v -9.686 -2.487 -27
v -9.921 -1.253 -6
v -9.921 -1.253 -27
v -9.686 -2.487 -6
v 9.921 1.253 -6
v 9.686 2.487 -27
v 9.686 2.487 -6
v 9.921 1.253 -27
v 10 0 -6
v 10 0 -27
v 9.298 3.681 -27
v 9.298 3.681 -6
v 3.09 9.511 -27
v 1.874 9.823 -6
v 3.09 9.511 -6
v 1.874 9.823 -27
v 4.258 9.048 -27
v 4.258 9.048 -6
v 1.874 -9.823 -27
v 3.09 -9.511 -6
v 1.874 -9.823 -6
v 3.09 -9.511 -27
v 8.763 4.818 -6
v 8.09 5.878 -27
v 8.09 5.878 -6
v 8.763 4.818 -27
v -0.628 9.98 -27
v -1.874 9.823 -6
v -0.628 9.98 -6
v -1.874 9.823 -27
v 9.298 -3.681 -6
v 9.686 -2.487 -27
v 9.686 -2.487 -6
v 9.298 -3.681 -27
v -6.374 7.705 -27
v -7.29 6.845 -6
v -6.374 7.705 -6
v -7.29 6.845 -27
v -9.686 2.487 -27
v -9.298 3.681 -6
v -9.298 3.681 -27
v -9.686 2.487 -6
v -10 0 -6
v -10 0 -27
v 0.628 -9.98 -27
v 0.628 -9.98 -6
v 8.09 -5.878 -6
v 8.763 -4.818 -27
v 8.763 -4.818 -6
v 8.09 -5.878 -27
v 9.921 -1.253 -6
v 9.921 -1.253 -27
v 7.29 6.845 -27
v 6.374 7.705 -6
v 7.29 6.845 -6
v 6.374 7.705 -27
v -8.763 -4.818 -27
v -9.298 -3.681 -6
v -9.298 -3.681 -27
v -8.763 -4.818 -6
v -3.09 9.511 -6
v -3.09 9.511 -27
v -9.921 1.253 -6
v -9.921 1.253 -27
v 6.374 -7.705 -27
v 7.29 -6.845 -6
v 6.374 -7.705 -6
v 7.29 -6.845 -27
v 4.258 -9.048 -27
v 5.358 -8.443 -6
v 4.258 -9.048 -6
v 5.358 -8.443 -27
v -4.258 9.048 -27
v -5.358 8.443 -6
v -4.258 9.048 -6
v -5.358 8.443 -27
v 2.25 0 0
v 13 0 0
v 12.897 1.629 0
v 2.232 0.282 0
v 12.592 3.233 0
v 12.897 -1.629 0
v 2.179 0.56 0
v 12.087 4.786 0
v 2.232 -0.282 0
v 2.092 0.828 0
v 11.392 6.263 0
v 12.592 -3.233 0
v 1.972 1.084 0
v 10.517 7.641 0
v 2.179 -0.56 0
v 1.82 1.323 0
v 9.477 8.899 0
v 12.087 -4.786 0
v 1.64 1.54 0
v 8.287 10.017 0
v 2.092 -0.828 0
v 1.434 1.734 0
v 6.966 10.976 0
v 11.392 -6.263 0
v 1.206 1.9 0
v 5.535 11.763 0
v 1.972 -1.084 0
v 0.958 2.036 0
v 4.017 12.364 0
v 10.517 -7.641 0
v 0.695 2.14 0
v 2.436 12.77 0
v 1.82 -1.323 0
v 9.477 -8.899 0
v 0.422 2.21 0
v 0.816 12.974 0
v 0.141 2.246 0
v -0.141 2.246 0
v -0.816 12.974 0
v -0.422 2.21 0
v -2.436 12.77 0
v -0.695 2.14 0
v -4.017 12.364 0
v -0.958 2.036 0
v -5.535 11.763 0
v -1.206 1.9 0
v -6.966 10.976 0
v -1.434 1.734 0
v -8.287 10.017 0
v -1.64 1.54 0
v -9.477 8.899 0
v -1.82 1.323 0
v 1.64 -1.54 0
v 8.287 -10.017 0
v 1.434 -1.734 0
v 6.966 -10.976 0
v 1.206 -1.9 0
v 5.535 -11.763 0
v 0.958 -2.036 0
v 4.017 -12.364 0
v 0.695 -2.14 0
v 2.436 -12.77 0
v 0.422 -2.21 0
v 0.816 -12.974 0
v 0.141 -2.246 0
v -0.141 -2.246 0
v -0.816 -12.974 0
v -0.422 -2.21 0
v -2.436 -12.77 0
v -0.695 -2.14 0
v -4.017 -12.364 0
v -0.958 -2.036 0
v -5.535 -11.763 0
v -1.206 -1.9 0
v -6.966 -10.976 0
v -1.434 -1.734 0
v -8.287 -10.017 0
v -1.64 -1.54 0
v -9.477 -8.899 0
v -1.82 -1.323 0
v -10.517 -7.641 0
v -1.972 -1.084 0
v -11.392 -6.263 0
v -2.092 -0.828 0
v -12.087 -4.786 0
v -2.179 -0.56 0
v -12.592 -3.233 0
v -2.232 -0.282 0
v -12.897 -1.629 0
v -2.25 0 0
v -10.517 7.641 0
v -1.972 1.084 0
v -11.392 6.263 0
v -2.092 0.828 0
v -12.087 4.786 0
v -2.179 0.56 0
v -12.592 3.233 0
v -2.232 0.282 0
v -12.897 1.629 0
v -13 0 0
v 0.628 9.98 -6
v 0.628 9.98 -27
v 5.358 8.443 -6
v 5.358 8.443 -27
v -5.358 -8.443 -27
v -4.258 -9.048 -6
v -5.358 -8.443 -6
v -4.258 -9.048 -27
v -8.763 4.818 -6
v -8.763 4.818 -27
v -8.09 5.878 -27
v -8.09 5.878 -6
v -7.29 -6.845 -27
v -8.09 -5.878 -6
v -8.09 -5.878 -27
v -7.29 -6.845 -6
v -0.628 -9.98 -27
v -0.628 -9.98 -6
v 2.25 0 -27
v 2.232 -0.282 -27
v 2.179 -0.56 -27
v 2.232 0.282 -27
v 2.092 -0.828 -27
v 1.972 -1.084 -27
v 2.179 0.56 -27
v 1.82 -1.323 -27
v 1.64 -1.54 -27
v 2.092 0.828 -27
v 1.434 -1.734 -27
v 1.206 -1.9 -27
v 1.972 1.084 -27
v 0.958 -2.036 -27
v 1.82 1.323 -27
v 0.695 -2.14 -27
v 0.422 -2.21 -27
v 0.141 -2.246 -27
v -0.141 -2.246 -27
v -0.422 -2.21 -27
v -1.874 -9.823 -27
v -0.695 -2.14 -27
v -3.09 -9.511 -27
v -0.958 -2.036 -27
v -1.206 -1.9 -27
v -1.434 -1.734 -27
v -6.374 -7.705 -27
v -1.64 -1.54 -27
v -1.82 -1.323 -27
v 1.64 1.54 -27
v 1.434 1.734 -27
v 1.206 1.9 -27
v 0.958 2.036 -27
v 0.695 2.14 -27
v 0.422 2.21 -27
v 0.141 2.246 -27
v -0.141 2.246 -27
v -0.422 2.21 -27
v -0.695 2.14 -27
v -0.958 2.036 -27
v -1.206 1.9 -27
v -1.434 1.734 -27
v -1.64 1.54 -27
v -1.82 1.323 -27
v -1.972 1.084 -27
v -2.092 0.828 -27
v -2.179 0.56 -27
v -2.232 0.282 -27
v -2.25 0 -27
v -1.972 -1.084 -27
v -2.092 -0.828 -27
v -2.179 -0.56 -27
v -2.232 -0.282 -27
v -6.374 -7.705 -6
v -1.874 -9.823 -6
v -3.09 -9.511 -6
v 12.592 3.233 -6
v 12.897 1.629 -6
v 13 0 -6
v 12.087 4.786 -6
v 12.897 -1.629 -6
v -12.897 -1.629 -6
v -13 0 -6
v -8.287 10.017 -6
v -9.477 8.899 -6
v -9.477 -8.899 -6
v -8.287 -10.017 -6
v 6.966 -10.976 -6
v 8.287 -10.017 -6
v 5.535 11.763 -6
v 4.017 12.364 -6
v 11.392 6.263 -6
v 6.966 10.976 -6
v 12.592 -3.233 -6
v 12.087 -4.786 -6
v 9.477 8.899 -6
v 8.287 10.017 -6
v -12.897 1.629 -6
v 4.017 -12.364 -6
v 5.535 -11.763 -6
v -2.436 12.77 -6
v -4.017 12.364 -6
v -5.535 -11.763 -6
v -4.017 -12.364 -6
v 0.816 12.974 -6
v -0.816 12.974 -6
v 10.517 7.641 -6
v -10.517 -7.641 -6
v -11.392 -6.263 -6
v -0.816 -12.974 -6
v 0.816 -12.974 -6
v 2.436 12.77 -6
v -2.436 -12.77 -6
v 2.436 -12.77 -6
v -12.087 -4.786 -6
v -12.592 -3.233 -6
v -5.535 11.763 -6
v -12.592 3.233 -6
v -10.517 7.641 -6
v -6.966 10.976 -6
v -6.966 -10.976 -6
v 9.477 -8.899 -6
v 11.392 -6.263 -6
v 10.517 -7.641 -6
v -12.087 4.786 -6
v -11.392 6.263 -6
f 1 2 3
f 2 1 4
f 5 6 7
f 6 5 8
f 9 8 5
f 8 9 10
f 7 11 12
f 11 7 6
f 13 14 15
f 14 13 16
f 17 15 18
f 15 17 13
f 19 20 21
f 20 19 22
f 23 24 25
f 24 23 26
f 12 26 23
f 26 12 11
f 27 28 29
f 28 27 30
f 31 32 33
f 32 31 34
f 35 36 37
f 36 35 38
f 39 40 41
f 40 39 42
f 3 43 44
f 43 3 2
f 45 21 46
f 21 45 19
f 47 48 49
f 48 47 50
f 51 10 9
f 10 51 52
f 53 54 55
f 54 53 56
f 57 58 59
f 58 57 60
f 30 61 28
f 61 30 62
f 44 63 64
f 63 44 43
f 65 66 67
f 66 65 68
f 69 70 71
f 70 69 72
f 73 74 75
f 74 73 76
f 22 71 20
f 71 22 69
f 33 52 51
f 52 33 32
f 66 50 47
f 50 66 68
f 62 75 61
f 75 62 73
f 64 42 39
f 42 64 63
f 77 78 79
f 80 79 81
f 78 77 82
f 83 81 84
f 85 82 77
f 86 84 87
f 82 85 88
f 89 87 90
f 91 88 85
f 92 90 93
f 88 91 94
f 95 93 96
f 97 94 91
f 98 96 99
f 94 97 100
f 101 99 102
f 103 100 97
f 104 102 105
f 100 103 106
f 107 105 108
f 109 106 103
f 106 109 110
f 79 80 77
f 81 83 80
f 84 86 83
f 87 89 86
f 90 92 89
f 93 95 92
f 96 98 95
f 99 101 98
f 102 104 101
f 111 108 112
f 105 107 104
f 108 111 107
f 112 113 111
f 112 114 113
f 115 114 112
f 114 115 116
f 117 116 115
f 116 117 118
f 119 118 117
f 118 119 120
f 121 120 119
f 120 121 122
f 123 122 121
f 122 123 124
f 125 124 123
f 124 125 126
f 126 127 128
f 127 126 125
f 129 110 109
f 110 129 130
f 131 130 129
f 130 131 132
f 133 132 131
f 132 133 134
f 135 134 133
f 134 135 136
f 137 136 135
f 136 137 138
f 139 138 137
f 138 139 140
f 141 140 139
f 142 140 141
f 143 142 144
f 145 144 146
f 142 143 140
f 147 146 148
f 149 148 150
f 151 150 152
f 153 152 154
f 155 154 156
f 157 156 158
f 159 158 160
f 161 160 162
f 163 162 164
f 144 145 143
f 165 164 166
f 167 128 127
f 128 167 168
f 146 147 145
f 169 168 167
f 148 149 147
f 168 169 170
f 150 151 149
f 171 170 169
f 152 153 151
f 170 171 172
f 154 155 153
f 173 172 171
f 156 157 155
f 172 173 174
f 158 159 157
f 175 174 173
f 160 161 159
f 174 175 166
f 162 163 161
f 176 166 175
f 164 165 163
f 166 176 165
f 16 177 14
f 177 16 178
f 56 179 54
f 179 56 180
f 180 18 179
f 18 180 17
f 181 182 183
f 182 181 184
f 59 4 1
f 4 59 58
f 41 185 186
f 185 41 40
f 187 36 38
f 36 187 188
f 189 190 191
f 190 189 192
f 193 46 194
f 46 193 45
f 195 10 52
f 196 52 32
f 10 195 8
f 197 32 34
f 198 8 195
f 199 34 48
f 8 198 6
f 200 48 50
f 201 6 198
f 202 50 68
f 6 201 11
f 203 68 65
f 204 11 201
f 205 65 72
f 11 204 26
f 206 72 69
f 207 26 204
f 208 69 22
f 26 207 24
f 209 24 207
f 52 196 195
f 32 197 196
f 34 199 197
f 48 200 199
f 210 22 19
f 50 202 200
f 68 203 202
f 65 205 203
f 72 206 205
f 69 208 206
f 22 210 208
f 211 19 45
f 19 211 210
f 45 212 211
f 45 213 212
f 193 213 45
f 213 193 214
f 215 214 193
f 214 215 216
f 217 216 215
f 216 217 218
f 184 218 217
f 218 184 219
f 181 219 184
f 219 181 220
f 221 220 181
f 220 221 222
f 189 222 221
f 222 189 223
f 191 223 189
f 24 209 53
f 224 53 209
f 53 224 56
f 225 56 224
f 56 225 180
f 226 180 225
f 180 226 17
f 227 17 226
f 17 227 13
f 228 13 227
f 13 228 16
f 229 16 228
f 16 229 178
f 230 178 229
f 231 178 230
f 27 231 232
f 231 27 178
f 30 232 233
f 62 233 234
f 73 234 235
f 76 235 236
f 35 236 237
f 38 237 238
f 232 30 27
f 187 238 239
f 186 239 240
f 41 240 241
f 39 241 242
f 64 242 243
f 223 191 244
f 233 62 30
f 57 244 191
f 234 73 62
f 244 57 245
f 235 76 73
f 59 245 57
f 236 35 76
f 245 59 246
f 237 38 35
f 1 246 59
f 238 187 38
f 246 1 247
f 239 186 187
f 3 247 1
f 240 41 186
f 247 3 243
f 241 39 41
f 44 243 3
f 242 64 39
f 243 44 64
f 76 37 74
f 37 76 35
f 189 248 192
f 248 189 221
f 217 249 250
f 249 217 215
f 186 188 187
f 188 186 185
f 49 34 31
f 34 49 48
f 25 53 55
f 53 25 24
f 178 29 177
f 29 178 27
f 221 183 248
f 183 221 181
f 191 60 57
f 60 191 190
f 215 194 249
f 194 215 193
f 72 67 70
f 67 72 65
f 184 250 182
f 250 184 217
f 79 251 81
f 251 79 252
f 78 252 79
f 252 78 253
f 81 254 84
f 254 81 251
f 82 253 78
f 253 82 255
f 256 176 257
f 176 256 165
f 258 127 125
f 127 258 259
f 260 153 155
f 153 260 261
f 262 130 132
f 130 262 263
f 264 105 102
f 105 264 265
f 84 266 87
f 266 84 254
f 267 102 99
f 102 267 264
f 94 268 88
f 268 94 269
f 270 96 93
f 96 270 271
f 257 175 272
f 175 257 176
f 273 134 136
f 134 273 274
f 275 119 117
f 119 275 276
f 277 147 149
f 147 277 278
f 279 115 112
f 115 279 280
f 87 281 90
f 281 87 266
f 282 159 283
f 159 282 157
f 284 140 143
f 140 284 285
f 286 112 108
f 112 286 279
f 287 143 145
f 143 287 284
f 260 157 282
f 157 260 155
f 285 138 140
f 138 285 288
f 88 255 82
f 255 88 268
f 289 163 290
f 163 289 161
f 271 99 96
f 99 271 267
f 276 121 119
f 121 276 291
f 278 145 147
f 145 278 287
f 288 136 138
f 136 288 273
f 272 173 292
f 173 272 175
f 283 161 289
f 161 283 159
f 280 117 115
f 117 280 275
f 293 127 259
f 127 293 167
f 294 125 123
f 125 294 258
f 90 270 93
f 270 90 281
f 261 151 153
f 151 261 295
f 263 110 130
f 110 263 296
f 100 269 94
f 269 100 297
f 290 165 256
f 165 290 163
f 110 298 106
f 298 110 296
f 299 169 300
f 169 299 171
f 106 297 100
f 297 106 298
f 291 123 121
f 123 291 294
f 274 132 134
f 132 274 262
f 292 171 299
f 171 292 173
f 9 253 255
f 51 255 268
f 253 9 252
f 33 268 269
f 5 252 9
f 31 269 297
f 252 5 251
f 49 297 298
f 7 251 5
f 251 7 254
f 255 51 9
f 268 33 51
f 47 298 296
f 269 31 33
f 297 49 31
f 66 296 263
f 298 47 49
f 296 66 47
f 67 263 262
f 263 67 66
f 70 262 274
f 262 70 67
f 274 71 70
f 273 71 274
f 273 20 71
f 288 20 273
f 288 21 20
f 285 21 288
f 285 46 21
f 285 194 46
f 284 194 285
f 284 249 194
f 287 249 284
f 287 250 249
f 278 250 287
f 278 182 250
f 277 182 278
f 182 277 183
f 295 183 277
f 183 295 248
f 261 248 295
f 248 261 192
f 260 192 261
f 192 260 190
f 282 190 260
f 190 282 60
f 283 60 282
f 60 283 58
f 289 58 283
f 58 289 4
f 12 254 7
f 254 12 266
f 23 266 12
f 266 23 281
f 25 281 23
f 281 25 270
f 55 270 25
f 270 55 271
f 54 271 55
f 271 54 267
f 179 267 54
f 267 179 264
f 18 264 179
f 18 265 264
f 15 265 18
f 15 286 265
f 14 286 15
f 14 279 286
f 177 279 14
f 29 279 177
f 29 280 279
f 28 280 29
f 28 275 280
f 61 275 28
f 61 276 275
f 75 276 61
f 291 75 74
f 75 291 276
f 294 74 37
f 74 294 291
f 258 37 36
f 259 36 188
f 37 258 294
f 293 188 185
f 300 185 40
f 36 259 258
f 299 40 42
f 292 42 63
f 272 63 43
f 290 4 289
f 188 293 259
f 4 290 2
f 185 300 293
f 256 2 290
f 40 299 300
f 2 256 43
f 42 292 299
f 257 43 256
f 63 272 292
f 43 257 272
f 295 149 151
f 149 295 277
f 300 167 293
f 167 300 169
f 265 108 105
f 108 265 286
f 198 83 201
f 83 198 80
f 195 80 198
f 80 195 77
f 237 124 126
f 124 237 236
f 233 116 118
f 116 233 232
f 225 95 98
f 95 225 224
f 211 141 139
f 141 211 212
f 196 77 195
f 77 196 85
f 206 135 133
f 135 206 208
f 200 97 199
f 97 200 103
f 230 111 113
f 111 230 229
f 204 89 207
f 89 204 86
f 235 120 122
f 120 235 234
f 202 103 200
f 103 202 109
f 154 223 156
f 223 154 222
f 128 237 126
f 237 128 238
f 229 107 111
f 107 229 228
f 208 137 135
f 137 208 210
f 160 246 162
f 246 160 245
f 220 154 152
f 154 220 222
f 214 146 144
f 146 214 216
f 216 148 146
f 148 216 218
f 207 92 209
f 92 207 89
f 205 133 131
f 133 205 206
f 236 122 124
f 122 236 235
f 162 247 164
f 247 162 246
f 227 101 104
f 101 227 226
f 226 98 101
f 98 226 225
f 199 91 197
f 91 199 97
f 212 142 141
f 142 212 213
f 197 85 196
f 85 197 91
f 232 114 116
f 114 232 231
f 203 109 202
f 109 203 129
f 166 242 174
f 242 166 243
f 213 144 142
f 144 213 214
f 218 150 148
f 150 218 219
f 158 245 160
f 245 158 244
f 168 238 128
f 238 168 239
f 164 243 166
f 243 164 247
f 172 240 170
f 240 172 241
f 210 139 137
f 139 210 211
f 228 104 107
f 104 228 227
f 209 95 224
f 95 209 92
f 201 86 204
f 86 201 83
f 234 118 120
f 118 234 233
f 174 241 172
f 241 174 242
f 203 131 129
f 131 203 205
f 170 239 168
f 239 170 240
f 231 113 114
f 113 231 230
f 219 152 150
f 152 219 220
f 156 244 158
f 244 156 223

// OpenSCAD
$fn = 50;


difference() {
	union() {
		translate(v = [0, 0, -27.0000000000]) {
			cylinder(h = 27, r = 10.0000000000);
		}
		translate(v = [0, 0, -6.0000000000]) {
			cylinder(h = 6, r = 13.0000000000);
		}
	}
	union() {
		#translate(v = [0, 0, -27]) {
			cylinder(h = 27, r = 2.2500000000);
		}
	}
}
